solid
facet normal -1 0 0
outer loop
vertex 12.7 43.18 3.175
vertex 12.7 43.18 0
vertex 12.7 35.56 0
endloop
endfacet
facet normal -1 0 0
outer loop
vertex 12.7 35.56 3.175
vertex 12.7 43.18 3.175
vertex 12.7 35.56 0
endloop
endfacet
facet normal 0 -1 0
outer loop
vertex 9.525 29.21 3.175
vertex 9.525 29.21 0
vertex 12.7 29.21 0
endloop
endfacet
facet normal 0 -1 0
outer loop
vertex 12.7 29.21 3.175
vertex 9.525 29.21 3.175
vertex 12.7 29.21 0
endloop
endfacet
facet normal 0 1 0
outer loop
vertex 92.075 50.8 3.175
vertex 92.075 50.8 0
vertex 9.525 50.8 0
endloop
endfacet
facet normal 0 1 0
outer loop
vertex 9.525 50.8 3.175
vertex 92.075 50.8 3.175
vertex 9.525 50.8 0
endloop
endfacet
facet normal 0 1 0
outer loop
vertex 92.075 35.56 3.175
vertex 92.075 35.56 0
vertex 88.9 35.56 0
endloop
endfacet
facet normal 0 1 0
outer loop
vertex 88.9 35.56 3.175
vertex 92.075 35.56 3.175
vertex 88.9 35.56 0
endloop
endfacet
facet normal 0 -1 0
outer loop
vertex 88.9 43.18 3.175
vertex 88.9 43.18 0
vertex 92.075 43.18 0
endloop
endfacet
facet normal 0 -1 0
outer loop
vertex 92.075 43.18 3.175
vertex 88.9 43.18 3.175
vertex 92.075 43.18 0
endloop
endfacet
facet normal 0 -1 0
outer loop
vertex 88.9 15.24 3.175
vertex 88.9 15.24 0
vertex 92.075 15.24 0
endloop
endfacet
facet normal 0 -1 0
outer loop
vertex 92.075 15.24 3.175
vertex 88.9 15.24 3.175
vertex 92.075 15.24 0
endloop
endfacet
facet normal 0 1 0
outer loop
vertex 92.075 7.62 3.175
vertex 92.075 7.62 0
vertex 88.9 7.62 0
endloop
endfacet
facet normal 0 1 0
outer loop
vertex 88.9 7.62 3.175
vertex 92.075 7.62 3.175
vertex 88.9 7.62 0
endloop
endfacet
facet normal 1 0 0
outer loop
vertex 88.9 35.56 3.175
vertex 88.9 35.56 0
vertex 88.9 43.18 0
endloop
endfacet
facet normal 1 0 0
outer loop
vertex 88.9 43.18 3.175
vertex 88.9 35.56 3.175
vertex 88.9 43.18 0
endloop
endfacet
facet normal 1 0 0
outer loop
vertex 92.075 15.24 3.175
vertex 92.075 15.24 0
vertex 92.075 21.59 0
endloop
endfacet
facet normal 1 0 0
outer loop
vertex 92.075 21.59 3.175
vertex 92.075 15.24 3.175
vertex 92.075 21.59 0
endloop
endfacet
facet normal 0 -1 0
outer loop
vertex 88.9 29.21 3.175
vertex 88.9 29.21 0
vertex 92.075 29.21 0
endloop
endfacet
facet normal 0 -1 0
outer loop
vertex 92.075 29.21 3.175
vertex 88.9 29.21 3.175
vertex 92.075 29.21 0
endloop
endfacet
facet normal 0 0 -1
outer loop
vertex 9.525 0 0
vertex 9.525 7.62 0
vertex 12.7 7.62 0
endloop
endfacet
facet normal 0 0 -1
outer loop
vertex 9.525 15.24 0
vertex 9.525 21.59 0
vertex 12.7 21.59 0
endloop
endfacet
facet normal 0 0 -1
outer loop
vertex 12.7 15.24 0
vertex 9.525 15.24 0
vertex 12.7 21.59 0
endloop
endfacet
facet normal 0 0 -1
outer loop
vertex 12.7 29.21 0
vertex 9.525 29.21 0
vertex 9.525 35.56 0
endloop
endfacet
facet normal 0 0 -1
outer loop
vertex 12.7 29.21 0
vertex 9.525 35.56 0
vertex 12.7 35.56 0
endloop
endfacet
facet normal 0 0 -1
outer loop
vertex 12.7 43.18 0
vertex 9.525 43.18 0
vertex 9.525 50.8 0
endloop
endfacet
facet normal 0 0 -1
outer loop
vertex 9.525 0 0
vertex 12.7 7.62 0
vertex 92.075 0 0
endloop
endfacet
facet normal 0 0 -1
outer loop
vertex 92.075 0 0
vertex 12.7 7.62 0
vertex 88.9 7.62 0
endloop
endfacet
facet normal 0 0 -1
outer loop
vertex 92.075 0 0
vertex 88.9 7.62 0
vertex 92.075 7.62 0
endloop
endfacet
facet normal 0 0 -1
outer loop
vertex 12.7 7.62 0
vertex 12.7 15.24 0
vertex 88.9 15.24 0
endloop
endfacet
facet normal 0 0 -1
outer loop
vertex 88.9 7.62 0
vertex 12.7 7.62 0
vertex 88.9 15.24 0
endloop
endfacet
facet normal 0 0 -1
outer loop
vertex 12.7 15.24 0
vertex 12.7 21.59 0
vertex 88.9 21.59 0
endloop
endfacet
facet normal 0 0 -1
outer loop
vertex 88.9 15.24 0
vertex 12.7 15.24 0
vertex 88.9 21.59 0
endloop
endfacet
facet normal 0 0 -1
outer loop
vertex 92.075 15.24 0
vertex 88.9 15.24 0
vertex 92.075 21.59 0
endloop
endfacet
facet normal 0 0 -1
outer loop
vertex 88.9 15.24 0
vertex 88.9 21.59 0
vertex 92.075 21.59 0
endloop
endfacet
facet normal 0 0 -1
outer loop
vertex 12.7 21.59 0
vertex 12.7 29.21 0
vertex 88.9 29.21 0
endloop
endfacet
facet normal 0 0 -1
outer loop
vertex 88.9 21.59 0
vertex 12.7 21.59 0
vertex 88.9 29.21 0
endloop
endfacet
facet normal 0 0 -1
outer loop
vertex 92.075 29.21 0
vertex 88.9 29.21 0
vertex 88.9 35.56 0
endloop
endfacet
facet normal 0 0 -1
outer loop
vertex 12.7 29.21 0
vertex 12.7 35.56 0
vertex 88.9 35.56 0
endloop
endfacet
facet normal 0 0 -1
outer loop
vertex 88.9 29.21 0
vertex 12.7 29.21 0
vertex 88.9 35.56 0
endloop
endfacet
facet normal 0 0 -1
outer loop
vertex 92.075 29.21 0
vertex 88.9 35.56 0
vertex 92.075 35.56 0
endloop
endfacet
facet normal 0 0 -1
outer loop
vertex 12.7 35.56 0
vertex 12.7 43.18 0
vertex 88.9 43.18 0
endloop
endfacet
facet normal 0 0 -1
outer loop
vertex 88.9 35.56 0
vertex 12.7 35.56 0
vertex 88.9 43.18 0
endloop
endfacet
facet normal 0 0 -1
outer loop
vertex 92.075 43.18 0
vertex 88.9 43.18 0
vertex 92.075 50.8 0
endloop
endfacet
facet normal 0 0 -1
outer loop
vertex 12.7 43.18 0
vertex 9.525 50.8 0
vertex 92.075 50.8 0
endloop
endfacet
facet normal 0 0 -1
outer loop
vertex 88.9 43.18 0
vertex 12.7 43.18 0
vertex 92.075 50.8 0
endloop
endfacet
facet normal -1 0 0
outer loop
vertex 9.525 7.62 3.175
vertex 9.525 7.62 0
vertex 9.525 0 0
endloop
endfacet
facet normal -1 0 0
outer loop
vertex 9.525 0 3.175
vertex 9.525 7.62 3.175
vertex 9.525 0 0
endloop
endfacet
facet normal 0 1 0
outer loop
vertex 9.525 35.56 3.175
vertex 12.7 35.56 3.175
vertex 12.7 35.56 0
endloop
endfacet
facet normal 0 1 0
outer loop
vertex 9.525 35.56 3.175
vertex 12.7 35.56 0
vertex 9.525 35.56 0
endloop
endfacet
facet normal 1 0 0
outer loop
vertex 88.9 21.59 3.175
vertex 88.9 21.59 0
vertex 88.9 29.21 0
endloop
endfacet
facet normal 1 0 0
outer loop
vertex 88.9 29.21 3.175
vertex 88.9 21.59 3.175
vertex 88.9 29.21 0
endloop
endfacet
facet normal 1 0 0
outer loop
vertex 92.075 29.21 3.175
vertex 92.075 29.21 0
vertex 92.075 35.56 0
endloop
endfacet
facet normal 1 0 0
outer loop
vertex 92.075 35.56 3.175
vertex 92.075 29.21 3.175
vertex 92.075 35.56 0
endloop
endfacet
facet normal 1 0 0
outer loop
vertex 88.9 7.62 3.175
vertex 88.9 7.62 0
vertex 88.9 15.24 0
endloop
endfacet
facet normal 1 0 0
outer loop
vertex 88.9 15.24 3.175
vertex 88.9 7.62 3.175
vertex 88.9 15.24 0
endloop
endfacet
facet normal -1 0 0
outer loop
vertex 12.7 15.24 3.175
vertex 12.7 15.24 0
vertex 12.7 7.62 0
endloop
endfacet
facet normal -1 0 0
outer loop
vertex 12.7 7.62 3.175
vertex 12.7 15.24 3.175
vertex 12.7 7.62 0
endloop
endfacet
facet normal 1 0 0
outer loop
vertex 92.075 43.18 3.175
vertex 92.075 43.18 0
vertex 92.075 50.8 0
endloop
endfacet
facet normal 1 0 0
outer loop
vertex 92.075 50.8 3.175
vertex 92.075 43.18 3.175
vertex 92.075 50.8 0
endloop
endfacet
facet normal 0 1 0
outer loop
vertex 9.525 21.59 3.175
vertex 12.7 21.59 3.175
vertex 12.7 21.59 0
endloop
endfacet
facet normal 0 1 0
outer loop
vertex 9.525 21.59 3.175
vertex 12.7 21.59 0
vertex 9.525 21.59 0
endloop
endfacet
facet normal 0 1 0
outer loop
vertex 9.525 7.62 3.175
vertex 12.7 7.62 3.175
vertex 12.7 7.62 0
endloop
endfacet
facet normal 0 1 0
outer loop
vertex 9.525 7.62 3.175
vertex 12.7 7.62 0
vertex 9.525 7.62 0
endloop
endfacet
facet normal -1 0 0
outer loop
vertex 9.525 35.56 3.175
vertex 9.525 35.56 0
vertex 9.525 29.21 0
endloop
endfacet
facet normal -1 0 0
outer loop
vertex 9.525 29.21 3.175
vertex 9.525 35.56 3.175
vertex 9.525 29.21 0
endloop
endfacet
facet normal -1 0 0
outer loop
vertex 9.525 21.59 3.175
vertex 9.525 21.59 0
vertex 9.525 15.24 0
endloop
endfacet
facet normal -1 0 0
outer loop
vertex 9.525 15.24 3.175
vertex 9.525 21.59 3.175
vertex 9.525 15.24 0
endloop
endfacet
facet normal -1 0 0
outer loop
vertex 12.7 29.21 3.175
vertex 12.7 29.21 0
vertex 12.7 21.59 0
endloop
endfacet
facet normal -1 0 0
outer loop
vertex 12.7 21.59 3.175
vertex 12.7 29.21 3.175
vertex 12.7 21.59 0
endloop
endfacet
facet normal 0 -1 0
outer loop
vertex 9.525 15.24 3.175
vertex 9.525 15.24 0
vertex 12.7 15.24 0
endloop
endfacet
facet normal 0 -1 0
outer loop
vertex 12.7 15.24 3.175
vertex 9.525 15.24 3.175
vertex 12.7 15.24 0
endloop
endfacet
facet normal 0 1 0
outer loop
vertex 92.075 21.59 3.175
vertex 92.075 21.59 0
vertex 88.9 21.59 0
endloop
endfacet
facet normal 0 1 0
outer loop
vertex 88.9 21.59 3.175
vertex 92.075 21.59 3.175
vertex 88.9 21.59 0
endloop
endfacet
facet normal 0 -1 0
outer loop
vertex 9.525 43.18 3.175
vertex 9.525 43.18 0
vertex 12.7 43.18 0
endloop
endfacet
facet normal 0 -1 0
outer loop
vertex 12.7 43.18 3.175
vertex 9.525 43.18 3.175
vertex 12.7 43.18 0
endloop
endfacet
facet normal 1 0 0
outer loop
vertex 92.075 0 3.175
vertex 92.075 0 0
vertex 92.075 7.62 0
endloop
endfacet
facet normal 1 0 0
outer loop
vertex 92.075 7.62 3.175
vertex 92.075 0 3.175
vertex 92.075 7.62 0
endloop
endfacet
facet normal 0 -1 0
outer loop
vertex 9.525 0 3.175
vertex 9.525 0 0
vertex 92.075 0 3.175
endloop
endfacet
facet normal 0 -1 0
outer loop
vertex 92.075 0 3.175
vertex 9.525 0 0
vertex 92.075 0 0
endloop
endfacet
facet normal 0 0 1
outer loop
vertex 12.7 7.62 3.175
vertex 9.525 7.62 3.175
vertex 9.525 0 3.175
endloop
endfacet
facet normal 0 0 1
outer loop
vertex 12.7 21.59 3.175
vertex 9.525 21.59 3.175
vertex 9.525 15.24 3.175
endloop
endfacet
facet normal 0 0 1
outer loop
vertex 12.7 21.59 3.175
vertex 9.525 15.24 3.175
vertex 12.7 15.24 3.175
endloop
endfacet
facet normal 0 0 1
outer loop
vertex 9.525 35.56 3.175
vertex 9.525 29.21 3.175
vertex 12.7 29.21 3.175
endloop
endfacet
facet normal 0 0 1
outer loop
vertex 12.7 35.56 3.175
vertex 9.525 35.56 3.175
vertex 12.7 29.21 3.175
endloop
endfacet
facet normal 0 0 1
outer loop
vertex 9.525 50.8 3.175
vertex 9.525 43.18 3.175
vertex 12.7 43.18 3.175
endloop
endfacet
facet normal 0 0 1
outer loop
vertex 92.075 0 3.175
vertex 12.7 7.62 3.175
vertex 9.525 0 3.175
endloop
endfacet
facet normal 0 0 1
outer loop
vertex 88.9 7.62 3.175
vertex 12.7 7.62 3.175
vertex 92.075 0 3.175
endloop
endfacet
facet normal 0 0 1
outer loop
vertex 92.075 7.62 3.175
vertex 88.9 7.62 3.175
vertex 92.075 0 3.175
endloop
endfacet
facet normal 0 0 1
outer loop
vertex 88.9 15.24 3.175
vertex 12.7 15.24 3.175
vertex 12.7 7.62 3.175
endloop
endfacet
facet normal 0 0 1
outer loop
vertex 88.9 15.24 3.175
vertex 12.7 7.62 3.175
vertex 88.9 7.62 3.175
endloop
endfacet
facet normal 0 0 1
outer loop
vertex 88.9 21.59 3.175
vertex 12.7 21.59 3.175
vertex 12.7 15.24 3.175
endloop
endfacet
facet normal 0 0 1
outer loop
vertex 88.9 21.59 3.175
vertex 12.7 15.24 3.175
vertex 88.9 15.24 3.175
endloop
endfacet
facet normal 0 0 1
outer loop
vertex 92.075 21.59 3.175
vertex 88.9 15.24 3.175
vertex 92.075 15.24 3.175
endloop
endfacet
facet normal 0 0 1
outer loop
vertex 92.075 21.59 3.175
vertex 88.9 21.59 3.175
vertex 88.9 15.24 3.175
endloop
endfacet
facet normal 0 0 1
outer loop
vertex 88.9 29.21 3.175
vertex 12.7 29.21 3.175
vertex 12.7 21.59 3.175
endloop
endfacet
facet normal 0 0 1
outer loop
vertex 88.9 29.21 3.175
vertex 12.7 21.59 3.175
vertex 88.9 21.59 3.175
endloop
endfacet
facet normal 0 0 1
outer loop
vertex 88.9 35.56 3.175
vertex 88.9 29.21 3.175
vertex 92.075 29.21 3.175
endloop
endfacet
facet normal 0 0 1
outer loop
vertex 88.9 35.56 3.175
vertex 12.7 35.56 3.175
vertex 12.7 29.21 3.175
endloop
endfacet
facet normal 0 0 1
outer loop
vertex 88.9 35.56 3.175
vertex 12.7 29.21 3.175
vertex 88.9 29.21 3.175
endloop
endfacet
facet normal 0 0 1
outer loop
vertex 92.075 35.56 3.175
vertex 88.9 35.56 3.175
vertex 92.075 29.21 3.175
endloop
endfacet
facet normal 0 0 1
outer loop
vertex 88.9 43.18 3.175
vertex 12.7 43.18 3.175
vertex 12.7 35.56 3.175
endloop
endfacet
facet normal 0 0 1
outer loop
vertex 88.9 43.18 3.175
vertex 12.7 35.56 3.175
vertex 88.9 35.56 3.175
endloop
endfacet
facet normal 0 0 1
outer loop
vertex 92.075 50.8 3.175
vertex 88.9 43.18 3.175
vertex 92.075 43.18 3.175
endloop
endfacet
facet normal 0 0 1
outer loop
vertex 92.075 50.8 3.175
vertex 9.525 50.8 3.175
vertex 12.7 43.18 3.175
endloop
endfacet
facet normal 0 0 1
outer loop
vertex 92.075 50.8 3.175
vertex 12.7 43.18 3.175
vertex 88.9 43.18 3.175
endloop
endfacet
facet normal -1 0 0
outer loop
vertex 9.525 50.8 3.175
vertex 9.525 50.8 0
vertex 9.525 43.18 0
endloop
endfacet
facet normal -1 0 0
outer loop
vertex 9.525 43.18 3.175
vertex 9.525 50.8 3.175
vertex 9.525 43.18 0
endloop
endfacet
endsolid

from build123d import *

# Parameters (mm, degrees)
F1_DEPTH = 3.175
F2_DEPTH = 9.525
F3_DEPTH = 9.525


with BuildPart() as f1:
    # F0 (on Top) → F1 (new body)
    with BuildSketch(Plane.XY):
        Polygon((0, 7.62), (0, 0), (101.6, 0), (101.6, 7.62), (88.9, 7.62), (88.9, 15.24), (101.6, 15.24), (101.6, 21.59), (88.9, 21.59), (88.9, 29.21), (101.6, 29.21), (101.6, 35.56), (88.9, 35.56), (88.9, 43.18), (101.6, 43.18), (101.6, 50.8), (0, 50.8), (0, 43.18), (12.7, 43.18), (12.7, 35.56), (0, 35.56), (0, 29.21), (12.7, 29.21), (12.7, 21.59), (0, 21.59), (0, 15.24), (12.7, 15.24), (12.7, 7.62), align=None)
    extrude(amount=F1_DEPTH)

    # F2 (cut): faces of the model
    f2_faces = [f1.faces().sort_by_distance(p)[0] for p in [
        (0, 46.99, 1.5875),
        (0, 32.385, 1.5875),
        (0, 18.415, 1.5875),
        (0, 3.81, 1.5875),
    ]]
    extrude(f2_faces, amount=-F2_DEPTH, mode=Mode.SUBTRACT)

    # F3 (cut): faces of the model
    f3_faces = [f1.faces().sort_by_distance(p)[0] for p in [
        (101.6, 3.81, 1.5875),
        (101.6, 18.415, 1.5875),
        (101.6, 32.385, 1.5875),
        (101.6, 46.99, 1.5875),
    ]]
    extrude(f3_faces, amount=-F3_DEPTH, mode=Mode.SUBTRACT)


solid = f1.part
